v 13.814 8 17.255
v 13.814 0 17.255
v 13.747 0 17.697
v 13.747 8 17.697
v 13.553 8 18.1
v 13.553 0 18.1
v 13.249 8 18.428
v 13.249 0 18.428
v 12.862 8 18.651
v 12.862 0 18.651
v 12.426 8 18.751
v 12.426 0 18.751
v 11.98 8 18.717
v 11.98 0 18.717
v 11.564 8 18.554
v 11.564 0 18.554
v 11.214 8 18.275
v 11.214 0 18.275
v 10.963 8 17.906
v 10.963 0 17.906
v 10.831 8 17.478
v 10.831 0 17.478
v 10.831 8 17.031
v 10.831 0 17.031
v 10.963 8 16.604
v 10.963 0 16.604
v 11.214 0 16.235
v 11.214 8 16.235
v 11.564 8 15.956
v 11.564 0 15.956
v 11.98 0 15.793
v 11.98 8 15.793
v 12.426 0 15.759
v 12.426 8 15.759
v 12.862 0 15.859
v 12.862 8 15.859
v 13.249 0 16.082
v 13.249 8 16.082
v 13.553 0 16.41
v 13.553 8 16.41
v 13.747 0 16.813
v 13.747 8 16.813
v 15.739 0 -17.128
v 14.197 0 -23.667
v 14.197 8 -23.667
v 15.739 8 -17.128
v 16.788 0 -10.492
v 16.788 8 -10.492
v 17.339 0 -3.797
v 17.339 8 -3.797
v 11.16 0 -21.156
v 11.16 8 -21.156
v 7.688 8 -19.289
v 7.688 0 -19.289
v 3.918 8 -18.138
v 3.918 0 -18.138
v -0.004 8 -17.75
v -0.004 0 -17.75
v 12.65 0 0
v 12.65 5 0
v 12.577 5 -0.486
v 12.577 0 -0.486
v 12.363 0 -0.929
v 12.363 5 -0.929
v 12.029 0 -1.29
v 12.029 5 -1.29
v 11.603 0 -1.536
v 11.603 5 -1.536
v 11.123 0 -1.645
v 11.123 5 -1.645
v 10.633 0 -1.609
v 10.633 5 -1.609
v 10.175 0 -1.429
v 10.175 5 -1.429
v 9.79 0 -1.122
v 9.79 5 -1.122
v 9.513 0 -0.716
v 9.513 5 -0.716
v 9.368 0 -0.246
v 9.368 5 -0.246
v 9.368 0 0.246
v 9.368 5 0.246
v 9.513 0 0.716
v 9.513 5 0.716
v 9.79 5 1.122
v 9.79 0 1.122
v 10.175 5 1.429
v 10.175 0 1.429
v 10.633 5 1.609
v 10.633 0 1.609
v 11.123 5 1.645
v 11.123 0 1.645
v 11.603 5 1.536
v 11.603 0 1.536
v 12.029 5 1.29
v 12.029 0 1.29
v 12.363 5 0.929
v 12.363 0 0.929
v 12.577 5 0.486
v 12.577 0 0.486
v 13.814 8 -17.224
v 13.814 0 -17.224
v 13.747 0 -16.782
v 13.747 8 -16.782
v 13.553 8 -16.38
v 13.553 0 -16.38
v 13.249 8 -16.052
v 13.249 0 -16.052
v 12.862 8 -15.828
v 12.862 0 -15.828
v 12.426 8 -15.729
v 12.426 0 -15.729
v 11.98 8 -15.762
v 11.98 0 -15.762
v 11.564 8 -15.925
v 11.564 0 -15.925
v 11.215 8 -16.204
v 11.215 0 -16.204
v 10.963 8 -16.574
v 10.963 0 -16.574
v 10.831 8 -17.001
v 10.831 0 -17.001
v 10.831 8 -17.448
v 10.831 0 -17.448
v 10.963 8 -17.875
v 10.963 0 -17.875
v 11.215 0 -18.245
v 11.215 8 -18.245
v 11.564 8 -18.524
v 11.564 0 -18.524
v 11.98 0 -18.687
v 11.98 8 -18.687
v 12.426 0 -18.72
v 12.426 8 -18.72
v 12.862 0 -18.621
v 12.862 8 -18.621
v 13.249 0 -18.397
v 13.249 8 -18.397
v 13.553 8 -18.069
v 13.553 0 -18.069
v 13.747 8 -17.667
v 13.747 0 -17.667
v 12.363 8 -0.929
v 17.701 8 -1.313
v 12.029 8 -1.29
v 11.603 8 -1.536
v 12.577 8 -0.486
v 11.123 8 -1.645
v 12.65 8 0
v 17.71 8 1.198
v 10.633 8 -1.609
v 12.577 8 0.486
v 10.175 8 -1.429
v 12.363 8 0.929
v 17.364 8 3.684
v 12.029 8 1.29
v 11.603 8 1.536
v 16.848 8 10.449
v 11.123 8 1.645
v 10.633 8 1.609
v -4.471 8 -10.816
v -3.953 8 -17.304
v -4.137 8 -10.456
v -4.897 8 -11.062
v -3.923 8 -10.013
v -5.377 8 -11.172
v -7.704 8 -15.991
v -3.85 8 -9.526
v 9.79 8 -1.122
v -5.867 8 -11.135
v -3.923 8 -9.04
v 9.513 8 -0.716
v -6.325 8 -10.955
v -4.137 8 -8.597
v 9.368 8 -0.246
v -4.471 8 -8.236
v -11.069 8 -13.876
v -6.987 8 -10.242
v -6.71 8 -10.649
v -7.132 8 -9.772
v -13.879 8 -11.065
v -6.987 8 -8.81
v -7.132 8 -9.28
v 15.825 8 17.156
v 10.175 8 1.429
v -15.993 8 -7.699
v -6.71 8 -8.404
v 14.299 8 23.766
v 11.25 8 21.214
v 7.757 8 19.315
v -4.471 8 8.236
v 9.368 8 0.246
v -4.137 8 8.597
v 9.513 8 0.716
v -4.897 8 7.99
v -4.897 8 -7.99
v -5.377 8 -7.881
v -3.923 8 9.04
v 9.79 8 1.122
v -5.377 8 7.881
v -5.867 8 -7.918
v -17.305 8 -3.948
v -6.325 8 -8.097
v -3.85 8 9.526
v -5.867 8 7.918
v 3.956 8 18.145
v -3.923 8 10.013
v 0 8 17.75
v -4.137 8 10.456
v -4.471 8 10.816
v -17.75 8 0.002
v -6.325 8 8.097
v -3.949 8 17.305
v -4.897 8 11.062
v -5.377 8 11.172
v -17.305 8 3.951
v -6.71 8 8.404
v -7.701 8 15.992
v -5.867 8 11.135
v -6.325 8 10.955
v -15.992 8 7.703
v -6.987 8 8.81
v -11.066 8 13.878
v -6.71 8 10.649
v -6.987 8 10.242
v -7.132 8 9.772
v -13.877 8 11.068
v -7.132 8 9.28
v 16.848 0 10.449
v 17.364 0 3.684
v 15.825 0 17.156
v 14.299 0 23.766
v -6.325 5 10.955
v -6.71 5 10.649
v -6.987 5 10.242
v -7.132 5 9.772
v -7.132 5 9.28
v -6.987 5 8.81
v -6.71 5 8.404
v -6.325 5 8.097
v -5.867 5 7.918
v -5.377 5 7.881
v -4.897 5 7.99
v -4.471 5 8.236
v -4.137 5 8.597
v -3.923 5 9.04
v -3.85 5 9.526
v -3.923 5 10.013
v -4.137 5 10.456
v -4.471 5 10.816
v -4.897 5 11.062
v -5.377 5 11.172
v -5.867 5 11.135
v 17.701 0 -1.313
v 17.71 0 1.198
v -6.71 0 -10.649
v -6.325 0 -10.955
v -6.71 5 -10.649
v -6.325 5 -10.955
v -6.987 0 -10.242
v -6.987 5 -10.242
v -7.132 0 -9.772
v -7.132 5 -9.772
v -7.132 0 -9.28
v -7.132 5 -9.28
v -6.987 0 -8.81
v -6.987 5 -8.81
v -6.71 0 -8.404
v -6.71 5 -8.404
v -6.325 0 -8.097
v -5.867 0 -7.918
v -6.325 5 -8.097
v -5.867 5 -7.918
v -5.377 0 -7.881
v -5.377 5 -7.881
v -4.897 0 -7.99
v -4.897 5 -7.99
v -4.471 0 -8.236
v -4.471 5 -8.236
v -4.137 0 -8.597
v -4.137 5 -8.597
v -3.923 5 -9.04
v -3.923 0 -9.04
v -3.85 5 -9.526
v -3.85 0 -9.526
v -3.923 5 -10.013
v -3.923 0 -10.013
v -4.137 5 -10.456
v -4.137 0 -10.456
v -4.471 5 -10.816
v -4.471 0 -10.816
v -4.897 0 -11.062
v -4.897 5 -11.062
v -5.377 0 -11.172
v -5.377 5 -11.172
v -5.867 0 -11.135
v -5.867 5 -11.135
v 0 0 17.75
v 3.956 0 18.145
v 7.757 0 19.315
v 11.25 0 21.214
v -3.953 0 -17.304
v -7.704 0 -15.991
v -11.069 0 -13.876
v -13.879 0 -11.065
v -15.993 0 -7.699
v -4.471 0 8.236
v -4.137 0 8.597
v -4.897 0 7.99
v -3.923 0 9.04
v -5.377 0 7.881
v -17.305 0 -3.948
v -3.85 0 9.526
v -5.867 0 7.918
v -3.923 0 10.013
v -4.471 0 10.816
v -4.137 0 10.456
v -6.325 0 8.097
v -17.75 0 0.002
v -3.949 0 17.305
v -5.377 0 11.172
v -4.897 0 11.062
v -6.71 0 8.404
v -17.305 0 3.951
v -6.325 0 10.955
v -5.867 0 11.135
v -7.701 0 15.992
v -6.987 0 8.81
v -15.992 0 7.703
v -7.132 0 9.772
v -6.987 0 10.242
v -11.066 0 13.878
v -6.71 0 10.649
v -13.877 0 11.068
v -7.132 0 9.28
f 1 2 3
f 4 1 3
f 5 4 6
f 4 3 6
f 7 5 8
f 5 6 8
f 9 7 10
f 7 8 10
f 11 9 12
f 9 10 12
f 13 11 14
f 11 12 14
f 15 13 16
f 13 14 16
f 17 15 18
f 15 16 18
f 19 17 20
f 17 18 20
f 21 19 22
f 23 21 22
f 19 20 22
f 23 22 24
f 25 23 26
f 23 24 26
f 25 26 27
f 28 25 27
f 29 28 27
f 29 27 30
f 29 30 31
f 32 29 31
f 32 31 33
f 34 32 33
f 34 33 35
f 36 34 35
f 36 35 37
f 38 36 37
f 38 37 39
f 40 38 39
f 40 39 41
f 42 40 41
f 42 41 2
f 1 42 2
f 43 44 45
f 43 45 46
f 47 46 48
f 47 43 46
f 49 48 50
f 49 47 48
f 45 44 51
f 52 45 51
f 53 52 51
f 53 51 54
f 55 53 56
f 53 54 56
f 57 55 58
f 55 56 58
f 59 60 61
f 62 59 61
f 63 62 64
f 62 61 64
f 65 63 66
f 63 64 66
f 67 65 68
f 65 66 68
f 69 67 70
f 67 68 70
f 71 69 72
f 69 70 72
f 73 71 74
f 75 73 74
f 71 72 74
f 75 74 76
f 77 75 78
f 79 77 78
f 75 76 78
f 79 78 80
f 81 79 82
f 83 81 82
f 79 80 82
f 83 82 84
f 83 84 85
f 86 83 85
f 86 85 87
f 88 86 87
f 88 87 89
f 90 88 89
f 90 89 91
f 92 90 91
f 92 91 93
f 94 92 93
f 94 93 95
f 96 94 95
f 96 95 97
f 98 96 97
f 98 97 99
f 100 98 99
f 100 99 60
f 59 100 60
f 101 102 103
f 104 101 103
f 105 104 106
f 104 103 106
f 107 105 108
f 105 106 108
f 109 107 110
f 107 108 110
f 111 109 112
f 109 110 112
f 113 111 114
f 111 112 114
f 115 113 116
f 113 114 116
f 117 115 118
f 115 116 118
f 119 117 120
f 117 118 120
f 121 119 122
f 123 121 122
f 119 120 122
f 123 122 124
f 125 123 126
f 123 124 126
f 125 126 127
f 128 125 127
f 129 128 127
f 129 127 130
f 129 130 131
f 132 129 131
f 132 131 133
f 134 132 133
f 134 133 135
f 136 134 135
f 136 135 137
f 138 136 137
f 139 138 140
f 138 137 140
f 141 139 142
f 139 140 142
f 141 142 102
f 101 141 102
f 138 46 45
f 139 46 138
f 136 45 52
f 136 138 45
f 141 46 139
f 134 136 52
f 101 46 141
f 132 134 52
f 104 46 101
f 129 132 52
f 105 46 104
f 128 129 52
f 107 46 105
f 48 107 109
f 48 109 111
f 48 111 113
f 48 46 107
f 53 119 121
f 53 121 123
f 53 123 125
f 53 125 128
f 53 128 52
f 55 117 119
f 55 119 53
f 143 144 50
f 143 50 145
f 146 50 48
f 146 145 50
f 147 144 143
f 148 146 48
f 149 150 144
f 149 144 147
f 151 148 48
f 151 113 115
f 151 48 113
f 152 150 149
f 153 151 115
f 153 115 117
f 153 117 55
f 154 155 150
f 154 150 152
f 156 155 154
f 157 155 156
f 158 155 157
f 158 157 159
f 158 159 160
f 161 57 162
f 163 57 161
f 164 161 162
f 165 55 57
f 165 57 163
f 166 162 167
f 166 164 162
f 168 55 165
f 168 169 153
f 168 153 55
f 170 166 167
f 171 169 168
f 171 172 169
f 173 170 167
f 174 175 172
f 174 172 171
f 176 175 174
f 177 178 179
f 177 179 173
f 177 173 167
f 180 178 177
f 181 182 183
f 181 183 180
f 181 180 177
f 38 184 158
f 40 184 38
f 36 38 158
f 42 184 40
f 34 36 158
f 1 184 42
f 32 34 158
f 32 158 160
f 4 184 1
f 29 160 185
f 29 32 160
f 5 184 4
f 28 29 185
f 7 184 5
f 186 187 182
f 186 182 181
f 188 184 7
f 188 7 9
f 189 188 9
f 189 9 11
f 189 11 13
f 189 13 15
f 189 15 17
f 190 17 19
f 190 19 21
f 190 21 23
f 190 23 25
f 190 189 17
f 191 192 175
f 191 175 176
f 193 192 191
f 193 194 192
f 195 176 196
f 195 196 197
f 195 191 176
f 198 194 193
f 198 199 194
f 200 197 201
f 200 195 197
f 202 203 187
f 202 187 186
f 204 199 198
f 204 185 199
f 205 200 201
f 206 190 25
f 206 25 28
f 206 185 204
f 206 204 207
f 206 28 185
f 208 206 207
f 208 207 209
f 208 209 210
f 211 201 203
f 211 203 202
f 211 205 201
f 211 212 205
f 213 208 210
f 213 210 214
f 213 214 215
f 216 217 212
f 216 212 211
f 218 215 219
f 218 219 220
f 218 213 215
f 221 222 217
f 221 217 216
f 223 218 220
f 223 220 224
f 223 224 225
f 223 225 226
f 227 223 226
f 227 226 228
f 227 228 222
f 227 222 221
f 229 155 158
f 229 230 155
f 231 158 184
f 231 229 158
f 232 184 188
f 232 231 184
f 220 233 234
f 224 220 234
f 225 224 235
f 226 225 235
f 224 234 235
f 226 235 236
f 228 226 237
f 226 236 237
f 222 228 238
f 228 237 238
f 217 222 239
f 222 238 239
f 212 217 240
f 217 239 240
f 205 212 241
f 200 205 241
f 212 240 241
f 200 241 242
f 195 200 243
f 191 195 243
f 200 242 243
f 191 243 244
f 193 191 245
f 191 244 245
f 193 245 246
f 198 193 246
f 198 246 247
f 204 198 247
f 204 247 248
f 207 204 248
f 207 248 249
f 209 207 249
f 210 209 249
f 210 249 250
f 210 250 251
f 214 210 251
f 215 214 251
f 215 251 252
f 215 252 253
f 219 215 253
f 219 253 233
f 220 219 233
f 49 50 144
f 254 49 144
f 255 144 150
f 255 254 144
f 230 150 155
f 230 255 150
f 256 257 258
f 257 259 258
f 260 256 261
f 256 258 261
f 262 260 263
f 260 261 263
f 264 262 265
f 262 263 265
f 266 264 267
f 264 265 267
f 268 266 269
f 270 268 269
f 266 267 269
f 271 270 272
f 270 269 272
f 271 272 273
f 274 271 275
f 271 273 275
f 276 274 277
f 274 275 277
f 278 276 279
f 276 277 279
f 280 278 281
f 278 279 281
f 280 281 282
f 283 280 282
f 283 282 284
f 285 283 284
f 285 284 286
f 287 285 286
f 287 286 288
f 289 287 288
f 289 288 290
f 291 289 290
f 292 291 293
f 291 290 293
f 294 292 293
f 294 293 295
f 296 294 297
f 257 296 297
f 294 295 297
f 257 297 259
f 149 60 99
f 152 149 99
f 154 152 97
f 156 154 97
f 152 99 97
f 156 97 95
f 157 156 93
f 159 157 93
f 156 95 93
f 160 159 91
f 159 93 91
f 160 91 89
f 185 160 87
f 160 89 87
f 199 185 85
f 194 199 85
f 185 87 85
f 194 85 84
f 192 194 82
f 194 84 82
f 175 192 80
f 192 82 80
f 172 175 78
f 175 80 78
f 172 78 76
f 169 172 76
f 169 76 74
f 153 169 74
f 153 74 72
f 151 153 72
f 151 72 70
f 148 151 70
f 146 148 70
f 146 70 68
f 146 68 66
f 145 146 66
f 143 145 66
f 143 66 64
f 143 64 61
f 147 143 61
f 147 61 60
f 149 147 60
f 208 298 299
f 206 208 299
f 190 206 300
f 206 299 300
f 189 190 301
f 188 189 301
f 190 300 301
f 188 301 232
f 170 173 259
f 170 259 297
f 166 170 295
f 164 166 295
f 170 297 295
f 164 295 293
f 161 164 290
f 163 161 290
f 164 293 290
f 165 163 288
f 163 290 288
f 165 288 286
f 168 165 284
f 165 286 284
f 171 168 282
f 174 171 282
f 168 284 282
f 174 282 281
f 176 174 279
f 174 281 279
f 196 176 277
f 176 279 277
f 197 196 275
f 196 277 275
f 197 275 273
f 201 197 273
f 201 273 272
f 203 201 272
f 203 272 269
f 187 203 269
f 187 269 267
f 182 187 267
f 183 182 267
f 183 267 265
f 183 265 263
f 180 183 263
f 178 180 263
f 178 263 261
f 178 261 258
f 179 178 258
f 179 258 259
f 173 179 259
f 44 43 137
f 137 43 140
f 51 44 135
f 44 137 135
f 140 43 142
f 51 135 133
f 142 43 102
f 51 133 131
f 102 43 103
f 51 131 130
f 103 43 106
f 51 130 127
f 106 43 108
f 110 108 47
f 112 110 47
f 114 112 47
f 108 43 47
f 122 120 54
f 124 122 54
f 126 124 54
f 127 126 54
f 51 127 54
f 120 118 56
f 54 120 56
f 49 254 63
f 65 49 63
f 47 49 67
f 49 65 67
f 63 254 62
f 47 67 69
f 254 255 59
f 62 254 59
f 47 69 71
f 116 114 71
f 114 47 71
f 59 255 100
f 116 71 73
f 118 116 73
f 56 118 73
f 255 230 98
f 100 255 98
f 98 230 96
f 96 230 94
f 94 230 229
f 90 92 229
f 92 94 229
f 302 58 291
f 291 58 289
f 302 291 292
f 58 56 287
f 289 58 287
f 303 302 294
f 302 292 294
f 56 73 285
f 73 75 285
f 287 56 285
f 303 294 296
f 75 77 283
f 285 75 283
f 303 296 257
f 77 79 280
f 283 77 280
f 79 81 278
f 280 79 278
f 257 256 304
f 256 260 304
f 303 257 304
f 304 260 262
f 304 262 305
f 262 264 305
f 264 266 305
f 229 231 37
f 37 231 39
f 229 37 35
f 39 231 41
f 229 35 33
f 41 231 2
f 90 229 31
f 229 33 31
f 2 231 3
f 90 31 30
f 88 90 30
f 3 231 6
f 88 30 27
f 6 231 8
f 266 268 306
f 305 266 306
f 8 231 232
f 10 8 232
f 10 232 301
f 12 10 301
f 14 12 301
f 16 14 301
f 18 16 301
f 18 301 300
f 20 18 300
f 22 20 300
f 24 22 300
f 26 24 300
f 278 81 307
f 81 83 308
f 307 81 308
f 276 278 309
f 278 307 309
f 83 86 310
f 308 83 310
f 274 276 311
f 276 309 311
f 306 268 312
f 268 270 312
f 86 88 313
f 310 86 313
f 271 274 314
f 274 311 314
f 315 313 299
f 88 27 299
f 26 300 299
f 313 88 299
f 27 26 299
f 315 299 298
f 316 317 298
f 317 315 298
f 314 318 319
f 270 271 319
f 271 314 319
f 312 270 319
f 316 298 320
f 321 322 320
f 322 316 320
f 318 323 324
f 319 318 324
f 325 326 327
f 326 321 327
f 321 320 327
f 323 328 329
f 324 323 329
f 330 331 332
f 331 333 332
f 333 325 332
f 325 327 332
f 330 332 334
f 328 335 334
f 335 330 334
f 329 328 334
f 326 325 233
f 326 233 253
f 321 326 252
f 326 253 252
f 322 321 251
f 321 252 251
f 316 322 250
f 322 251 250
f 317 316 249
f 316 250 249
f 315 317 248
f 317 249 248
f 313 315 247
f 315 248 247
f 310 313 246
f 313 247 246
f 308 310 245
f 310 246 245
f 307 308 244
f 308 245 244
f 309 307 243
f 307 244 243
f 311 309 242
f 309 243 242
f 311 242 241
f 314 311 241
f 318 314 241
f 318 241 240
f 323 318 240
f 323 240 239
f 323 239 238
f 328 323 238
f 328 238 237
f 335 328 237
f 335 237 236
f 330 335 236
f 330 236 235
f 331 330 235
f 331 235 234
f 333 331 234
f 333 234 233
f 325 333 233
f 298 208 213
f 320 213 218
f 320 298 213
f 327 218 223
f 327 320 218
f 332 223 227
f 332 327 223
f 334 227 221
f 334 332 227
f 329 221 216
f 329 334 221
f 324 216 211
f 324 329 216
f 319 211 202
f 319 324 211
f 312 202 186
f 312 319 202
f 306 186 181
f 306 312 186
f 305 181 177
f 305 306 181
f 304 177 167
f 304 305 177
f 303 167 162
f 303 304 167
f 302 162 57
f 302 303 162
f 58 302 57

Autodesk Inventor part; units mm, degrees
ref_plane "YZ Plane" through (0, 0, 0) normal (1, 0, 0) x (0, 1, 0)
ref_plane "XZ Plane" through (0, 0, 0) normal (0, 1, 0) x (-1, 0, 0)
sketch "Esquisse1" plane through (0, 0, 0) normal (0, 1, 0) x (-1, 0, 0)
  circle A0 centre (0, 0) radius 17.75
  dimension "d0" = 35.5
extrude "Extrusion1" add sketch "Esquisse1" along normal blind 8
ref_plane "Plan de construction1" through (0, 5, 0) normal (0, -1, 0) x (1, 0, 0)
sketch "Esquisse2" plane through (0, 5, 0) normal (0, -1, 0) x (1, 0, 0)
  circle A0 centre (0, 0) radius 17.75 construction
  line L0 (0, 0) -> (11, 0) construction
  circle A1 centre (11, 0) radius 1.65
  dimension "d4" = 11
  dimension "d5" = 3.3
extrude "Extrusion2" cut sketch "Esquisse2" along normal through all both and the other way through all
sketch "Esquisse3" plane through (0, 5, 0) normal (0, -1, 0) x (1, 0, 0)
  line L0 (23.2, 2.825) -> (8.2, 2.825)
  line L1 (8.2, 2.825) -> (8.2, -2.825)
  line L2 (8.2, -2.825) -> (23.2, -2.825)
  line L3 (23.2, -2.825) -> (23.2, 2.825)
  circle A0 centre (11, 0) radius 1.65 construction
  circle A1 centre (0, 0) radius 17.75 construction
  line L4 (0, 0) -> (8.2, 0) construction
  dimension "d8" = 5.65
  dimension "d9" = 2.8
  dimension "d10" = 15
pattern_circular "Réseau circulaire1" count 3 over 360 about axis through (0, 0, 0) along (0, -1, 0) of "Extrusion2"
ref_plane "Work Plane2" through (0, 6.5, 0) normal (0, 1, 0) x (1, 0, 0)
sketch "Sketch4" plane through (0, 6.5, 0) normal (0, 1, 0) x (1, 0, 0)
  circle A0 centre (0, 0) radius 17
  circle A1 centre (-5.5, -9.5263) radius 1.65 projected
  circle A2 centre (11, 0) radius 1.65 projected
  circle A3 centre (0, 0) radius 17.75 projected
  circle A4 centre (0, 0) radius 17.75 projected
  line L0 (-5.1051, -17) -> (-5.1051, 17)
  dimension "d17" = 34
extrude "Extrusion4" [suppressed]
sketch "Sketch7" plane through (0, 0, 0) normal (0, -1, 0) x (1, 0, 0)
  circle A0 centre (-5.5, -9.5263) radius 1.65 projected
  circle A1 centre (-5.5, 9.5263) radius 1.65 projected
  circle A2 centre (11, 0) radius 1.65 projected
  circle A3 centre (0, 0) radius 17.75 projected
  arc A4 (12.2653, -21.0869) -> (-1.702, -23.304) centre (6.3902, -29.1791) ccw construction
  line L0 (12.2653, -21.0869) -> (14.1974, -23.6673) construction
  arc A5 (16.0148, -22.871) -> (19.1393, -21.699) centre (17.1898, -21.2525) ccw construction
  arc A6 (19.1393, -21.699) -> (17.9505, 23.1047) centre (-68.5898, -1.6093) ccw construction
  arc A7 (17.9505, 23.1047) -> (14.8221, 24.7813) centre (15.9506, 23.1301) ccw construction
  line L1 (14.8221, 24.7813) -> (14.299, 23.7665) construction
  circle A8 centre (10.9719, 0.0309) radius 1.5
  circle A9 centre (12.314, 17.2549) radius 1.5
  circle A10 centre (12.3141, -17.2245) radius 1.5
  circle A11 centre (10.9719, -0.0082) radius 3
  circle A12 centre (10.9719, -0.0082) radius 1.5
  circle A13 centre (12.3141, -17.2245) radius 1.5
  circle A14 centre (12.3141, -17.2245) radius 1.5
  arc A15 (14.1974, -23.6673) -> (17.3392, -3.7967) centre (-72.5704, 0.2356) ccw
  arc A16 (17.3635, 3.6841) -> (14.299, 23.7665) centre (-72.5704, 0.2356) ccw
  circle A17 centre (0, 0) radius 17.75 projected
  arc A18 (14.1974, -23.6673) -> (-0.0039, -17.75) centre (-0.0039, -37.75) ccw
  arc A19 (0, 17.75) -> (14.299, 23.7665) centre (0, 37.75) ccw
  circle A20 centre (-5.5, -9.5263) radius 1.65 projected
  circle A21 centre (-5.5, 9.5263) radius 1.65 projected
  circle A22 centre (11, 0) radius 1.65 projected
  circle A23 centre (0, 0) radius 17.75 projected
  dimension "d50" = 1.3141
  dimension "d51" = 17.2245
  dimension "d53" = 20
  dimension "d54" = 20
  dimension "d61" = 1.314
  dimension "d62" = 17.224
  dimension "d63" = 90
  dimension "d64" = 90
  dimension "d66" = 20
  dimension "d67" = 20
extrude "Extrusion5" add sketch "Sketch7" against normal blind 8 contours A3 A19 A16 | A15 A18 A3
sketch "Sketch8" plane through (0, 8, 0) normal (0, 1, 0) x (1, 0, 0)
  circle A0 centre (12.3141, 17.2245) radius 1.5 projected
  circle A1 centre (12.314, -17.2549) radius 1.5 projected
  circle A2 centre (-5.5, 9.5263) radius 1.65 projected
  circle A3 centre (-5.5, -9.5263) radius 1.65 projected
  circle A4 centre (11, 0) radius 1.65 projected
  arc A5 (-0.0039, 17.75) -> (0, -17.75) centre (0, 0) ccw projected
  arc A6 (14.299, -23.7665) -> (0, -17.75) centre (0, -37.75) ccw projected
  arc A7 (14.299, -23.7665) -> (17.3635, -3.6841) centre (-72.5704, -0.2356) ccw projected
  arc A8 (17.3635, -3.6841) -> (17.3392, 3.7967) centre (0, 0) ccw projected
  arc A9 (17.3392, 3.7967) -> (14.1974, 23.6673) centre (-72.5704, -0.2356) ccw projected
  arc A10 (-0.0039, 17.75) -> (14.1974, 23.6673) centre (-0.0039, 37.75) ccw projected
  arc A11 (14.299, -23.7665) -> (0, -17.75) centre (0, -37.75) ccw projected
  arc A12 (14.8721, -21.5382) -> (13.3292, -20.2477) centre (0, -37.75) ccw
  arc A13 (12.6827, -1.3087) -> (12.7364, 0.5886) centre (0, 0) ccw
  arc A14 (10.3425, 14.4255) -> (10.6571, 14.5677) centre (-0.0039, 37.75) ccw
  arc A15 (15.5707, -3.4578) -> (15.5479, 3.5588) centre (0, 0) ccw
  arc A16 (15.5479, 3.5588) -> (13.2545, 20.0947) centre (-72.5704, -0.2356) ccw
  arc A17 (17.3392, 3.7967) -> (14.1974, 23.6673) centre (-72.5704, -0.2356) ccw projected
  arc A18 (13.3292, -20.2477) -> (15.5707, -3.4578) centre (-72.5704, -0.2356) ccw
  arc A19 (11.9075, 19.0825) -> (11.9222, 19.0926) centre (-0.6265, 37.1628) ccw
  arc A20 (13.2545, 20.0947) -> (14.7767, 21.4548) centre (-0.6265, 37.1628) ccw
  dimension "d59" = 2
  dimension "d68" = 1.8
  dimension "d69" = 1.8
ref_plane "Work Plane3" through (0, 6.5, 0) normal (0, 1, 0) x (1, 0, 0)
ref_plane "Work Plane4" through (0, 1.5, 0) normal (0, -1, 0) x (1, 0, 0)
equation "\"d6\" = d5"
properties part number "capacitor_glue"
